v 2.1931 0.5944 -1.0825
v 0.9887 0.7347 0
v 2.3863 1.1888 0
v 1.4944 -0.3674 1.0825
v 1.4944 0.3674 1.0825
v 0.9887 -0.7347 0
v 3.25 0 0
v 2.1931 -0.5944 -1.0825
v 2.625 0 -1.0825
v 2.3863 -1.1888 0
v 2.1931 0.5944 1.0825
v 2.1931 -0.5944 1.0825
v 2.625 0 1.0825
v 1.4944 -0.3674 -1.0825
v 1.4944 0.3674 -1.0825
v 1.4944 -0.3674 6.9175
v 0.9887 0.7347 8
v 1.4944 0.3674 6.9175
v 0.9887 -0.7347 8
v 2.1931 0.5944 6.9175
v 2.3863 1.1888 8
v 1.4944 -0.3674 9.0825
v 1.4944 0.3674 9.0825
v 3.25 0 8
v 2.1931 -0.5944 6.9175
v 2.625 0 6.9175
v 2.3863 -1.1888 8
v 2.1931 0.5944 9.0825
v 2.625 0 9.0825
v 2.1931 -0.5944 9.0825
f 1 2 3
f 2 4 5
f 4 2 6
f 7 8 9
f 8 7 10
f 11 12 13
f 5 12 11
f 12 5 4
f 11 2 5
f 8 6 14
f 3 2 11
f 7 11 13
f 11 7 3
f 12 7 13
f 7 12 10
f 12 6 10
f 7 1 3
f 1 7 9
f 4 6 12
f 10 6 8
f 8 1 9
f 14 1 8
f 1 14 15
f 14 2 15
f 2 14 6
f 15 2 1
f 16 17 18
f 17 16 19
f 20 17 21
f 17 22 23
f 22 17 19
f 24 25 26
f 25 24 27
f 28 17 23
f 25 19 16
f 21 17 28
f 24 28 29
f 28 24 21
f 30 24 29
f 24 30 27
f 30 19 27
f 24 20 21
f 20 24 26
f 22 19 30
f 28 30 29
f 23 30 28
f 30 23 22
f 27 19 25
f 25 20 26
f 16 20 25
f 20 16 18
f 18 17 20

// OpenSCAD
union() {
	translate([2, 0, 0]) sphere(r=1.25);
	translate([2, 0, 8]) sphere(r=1.25);
}
